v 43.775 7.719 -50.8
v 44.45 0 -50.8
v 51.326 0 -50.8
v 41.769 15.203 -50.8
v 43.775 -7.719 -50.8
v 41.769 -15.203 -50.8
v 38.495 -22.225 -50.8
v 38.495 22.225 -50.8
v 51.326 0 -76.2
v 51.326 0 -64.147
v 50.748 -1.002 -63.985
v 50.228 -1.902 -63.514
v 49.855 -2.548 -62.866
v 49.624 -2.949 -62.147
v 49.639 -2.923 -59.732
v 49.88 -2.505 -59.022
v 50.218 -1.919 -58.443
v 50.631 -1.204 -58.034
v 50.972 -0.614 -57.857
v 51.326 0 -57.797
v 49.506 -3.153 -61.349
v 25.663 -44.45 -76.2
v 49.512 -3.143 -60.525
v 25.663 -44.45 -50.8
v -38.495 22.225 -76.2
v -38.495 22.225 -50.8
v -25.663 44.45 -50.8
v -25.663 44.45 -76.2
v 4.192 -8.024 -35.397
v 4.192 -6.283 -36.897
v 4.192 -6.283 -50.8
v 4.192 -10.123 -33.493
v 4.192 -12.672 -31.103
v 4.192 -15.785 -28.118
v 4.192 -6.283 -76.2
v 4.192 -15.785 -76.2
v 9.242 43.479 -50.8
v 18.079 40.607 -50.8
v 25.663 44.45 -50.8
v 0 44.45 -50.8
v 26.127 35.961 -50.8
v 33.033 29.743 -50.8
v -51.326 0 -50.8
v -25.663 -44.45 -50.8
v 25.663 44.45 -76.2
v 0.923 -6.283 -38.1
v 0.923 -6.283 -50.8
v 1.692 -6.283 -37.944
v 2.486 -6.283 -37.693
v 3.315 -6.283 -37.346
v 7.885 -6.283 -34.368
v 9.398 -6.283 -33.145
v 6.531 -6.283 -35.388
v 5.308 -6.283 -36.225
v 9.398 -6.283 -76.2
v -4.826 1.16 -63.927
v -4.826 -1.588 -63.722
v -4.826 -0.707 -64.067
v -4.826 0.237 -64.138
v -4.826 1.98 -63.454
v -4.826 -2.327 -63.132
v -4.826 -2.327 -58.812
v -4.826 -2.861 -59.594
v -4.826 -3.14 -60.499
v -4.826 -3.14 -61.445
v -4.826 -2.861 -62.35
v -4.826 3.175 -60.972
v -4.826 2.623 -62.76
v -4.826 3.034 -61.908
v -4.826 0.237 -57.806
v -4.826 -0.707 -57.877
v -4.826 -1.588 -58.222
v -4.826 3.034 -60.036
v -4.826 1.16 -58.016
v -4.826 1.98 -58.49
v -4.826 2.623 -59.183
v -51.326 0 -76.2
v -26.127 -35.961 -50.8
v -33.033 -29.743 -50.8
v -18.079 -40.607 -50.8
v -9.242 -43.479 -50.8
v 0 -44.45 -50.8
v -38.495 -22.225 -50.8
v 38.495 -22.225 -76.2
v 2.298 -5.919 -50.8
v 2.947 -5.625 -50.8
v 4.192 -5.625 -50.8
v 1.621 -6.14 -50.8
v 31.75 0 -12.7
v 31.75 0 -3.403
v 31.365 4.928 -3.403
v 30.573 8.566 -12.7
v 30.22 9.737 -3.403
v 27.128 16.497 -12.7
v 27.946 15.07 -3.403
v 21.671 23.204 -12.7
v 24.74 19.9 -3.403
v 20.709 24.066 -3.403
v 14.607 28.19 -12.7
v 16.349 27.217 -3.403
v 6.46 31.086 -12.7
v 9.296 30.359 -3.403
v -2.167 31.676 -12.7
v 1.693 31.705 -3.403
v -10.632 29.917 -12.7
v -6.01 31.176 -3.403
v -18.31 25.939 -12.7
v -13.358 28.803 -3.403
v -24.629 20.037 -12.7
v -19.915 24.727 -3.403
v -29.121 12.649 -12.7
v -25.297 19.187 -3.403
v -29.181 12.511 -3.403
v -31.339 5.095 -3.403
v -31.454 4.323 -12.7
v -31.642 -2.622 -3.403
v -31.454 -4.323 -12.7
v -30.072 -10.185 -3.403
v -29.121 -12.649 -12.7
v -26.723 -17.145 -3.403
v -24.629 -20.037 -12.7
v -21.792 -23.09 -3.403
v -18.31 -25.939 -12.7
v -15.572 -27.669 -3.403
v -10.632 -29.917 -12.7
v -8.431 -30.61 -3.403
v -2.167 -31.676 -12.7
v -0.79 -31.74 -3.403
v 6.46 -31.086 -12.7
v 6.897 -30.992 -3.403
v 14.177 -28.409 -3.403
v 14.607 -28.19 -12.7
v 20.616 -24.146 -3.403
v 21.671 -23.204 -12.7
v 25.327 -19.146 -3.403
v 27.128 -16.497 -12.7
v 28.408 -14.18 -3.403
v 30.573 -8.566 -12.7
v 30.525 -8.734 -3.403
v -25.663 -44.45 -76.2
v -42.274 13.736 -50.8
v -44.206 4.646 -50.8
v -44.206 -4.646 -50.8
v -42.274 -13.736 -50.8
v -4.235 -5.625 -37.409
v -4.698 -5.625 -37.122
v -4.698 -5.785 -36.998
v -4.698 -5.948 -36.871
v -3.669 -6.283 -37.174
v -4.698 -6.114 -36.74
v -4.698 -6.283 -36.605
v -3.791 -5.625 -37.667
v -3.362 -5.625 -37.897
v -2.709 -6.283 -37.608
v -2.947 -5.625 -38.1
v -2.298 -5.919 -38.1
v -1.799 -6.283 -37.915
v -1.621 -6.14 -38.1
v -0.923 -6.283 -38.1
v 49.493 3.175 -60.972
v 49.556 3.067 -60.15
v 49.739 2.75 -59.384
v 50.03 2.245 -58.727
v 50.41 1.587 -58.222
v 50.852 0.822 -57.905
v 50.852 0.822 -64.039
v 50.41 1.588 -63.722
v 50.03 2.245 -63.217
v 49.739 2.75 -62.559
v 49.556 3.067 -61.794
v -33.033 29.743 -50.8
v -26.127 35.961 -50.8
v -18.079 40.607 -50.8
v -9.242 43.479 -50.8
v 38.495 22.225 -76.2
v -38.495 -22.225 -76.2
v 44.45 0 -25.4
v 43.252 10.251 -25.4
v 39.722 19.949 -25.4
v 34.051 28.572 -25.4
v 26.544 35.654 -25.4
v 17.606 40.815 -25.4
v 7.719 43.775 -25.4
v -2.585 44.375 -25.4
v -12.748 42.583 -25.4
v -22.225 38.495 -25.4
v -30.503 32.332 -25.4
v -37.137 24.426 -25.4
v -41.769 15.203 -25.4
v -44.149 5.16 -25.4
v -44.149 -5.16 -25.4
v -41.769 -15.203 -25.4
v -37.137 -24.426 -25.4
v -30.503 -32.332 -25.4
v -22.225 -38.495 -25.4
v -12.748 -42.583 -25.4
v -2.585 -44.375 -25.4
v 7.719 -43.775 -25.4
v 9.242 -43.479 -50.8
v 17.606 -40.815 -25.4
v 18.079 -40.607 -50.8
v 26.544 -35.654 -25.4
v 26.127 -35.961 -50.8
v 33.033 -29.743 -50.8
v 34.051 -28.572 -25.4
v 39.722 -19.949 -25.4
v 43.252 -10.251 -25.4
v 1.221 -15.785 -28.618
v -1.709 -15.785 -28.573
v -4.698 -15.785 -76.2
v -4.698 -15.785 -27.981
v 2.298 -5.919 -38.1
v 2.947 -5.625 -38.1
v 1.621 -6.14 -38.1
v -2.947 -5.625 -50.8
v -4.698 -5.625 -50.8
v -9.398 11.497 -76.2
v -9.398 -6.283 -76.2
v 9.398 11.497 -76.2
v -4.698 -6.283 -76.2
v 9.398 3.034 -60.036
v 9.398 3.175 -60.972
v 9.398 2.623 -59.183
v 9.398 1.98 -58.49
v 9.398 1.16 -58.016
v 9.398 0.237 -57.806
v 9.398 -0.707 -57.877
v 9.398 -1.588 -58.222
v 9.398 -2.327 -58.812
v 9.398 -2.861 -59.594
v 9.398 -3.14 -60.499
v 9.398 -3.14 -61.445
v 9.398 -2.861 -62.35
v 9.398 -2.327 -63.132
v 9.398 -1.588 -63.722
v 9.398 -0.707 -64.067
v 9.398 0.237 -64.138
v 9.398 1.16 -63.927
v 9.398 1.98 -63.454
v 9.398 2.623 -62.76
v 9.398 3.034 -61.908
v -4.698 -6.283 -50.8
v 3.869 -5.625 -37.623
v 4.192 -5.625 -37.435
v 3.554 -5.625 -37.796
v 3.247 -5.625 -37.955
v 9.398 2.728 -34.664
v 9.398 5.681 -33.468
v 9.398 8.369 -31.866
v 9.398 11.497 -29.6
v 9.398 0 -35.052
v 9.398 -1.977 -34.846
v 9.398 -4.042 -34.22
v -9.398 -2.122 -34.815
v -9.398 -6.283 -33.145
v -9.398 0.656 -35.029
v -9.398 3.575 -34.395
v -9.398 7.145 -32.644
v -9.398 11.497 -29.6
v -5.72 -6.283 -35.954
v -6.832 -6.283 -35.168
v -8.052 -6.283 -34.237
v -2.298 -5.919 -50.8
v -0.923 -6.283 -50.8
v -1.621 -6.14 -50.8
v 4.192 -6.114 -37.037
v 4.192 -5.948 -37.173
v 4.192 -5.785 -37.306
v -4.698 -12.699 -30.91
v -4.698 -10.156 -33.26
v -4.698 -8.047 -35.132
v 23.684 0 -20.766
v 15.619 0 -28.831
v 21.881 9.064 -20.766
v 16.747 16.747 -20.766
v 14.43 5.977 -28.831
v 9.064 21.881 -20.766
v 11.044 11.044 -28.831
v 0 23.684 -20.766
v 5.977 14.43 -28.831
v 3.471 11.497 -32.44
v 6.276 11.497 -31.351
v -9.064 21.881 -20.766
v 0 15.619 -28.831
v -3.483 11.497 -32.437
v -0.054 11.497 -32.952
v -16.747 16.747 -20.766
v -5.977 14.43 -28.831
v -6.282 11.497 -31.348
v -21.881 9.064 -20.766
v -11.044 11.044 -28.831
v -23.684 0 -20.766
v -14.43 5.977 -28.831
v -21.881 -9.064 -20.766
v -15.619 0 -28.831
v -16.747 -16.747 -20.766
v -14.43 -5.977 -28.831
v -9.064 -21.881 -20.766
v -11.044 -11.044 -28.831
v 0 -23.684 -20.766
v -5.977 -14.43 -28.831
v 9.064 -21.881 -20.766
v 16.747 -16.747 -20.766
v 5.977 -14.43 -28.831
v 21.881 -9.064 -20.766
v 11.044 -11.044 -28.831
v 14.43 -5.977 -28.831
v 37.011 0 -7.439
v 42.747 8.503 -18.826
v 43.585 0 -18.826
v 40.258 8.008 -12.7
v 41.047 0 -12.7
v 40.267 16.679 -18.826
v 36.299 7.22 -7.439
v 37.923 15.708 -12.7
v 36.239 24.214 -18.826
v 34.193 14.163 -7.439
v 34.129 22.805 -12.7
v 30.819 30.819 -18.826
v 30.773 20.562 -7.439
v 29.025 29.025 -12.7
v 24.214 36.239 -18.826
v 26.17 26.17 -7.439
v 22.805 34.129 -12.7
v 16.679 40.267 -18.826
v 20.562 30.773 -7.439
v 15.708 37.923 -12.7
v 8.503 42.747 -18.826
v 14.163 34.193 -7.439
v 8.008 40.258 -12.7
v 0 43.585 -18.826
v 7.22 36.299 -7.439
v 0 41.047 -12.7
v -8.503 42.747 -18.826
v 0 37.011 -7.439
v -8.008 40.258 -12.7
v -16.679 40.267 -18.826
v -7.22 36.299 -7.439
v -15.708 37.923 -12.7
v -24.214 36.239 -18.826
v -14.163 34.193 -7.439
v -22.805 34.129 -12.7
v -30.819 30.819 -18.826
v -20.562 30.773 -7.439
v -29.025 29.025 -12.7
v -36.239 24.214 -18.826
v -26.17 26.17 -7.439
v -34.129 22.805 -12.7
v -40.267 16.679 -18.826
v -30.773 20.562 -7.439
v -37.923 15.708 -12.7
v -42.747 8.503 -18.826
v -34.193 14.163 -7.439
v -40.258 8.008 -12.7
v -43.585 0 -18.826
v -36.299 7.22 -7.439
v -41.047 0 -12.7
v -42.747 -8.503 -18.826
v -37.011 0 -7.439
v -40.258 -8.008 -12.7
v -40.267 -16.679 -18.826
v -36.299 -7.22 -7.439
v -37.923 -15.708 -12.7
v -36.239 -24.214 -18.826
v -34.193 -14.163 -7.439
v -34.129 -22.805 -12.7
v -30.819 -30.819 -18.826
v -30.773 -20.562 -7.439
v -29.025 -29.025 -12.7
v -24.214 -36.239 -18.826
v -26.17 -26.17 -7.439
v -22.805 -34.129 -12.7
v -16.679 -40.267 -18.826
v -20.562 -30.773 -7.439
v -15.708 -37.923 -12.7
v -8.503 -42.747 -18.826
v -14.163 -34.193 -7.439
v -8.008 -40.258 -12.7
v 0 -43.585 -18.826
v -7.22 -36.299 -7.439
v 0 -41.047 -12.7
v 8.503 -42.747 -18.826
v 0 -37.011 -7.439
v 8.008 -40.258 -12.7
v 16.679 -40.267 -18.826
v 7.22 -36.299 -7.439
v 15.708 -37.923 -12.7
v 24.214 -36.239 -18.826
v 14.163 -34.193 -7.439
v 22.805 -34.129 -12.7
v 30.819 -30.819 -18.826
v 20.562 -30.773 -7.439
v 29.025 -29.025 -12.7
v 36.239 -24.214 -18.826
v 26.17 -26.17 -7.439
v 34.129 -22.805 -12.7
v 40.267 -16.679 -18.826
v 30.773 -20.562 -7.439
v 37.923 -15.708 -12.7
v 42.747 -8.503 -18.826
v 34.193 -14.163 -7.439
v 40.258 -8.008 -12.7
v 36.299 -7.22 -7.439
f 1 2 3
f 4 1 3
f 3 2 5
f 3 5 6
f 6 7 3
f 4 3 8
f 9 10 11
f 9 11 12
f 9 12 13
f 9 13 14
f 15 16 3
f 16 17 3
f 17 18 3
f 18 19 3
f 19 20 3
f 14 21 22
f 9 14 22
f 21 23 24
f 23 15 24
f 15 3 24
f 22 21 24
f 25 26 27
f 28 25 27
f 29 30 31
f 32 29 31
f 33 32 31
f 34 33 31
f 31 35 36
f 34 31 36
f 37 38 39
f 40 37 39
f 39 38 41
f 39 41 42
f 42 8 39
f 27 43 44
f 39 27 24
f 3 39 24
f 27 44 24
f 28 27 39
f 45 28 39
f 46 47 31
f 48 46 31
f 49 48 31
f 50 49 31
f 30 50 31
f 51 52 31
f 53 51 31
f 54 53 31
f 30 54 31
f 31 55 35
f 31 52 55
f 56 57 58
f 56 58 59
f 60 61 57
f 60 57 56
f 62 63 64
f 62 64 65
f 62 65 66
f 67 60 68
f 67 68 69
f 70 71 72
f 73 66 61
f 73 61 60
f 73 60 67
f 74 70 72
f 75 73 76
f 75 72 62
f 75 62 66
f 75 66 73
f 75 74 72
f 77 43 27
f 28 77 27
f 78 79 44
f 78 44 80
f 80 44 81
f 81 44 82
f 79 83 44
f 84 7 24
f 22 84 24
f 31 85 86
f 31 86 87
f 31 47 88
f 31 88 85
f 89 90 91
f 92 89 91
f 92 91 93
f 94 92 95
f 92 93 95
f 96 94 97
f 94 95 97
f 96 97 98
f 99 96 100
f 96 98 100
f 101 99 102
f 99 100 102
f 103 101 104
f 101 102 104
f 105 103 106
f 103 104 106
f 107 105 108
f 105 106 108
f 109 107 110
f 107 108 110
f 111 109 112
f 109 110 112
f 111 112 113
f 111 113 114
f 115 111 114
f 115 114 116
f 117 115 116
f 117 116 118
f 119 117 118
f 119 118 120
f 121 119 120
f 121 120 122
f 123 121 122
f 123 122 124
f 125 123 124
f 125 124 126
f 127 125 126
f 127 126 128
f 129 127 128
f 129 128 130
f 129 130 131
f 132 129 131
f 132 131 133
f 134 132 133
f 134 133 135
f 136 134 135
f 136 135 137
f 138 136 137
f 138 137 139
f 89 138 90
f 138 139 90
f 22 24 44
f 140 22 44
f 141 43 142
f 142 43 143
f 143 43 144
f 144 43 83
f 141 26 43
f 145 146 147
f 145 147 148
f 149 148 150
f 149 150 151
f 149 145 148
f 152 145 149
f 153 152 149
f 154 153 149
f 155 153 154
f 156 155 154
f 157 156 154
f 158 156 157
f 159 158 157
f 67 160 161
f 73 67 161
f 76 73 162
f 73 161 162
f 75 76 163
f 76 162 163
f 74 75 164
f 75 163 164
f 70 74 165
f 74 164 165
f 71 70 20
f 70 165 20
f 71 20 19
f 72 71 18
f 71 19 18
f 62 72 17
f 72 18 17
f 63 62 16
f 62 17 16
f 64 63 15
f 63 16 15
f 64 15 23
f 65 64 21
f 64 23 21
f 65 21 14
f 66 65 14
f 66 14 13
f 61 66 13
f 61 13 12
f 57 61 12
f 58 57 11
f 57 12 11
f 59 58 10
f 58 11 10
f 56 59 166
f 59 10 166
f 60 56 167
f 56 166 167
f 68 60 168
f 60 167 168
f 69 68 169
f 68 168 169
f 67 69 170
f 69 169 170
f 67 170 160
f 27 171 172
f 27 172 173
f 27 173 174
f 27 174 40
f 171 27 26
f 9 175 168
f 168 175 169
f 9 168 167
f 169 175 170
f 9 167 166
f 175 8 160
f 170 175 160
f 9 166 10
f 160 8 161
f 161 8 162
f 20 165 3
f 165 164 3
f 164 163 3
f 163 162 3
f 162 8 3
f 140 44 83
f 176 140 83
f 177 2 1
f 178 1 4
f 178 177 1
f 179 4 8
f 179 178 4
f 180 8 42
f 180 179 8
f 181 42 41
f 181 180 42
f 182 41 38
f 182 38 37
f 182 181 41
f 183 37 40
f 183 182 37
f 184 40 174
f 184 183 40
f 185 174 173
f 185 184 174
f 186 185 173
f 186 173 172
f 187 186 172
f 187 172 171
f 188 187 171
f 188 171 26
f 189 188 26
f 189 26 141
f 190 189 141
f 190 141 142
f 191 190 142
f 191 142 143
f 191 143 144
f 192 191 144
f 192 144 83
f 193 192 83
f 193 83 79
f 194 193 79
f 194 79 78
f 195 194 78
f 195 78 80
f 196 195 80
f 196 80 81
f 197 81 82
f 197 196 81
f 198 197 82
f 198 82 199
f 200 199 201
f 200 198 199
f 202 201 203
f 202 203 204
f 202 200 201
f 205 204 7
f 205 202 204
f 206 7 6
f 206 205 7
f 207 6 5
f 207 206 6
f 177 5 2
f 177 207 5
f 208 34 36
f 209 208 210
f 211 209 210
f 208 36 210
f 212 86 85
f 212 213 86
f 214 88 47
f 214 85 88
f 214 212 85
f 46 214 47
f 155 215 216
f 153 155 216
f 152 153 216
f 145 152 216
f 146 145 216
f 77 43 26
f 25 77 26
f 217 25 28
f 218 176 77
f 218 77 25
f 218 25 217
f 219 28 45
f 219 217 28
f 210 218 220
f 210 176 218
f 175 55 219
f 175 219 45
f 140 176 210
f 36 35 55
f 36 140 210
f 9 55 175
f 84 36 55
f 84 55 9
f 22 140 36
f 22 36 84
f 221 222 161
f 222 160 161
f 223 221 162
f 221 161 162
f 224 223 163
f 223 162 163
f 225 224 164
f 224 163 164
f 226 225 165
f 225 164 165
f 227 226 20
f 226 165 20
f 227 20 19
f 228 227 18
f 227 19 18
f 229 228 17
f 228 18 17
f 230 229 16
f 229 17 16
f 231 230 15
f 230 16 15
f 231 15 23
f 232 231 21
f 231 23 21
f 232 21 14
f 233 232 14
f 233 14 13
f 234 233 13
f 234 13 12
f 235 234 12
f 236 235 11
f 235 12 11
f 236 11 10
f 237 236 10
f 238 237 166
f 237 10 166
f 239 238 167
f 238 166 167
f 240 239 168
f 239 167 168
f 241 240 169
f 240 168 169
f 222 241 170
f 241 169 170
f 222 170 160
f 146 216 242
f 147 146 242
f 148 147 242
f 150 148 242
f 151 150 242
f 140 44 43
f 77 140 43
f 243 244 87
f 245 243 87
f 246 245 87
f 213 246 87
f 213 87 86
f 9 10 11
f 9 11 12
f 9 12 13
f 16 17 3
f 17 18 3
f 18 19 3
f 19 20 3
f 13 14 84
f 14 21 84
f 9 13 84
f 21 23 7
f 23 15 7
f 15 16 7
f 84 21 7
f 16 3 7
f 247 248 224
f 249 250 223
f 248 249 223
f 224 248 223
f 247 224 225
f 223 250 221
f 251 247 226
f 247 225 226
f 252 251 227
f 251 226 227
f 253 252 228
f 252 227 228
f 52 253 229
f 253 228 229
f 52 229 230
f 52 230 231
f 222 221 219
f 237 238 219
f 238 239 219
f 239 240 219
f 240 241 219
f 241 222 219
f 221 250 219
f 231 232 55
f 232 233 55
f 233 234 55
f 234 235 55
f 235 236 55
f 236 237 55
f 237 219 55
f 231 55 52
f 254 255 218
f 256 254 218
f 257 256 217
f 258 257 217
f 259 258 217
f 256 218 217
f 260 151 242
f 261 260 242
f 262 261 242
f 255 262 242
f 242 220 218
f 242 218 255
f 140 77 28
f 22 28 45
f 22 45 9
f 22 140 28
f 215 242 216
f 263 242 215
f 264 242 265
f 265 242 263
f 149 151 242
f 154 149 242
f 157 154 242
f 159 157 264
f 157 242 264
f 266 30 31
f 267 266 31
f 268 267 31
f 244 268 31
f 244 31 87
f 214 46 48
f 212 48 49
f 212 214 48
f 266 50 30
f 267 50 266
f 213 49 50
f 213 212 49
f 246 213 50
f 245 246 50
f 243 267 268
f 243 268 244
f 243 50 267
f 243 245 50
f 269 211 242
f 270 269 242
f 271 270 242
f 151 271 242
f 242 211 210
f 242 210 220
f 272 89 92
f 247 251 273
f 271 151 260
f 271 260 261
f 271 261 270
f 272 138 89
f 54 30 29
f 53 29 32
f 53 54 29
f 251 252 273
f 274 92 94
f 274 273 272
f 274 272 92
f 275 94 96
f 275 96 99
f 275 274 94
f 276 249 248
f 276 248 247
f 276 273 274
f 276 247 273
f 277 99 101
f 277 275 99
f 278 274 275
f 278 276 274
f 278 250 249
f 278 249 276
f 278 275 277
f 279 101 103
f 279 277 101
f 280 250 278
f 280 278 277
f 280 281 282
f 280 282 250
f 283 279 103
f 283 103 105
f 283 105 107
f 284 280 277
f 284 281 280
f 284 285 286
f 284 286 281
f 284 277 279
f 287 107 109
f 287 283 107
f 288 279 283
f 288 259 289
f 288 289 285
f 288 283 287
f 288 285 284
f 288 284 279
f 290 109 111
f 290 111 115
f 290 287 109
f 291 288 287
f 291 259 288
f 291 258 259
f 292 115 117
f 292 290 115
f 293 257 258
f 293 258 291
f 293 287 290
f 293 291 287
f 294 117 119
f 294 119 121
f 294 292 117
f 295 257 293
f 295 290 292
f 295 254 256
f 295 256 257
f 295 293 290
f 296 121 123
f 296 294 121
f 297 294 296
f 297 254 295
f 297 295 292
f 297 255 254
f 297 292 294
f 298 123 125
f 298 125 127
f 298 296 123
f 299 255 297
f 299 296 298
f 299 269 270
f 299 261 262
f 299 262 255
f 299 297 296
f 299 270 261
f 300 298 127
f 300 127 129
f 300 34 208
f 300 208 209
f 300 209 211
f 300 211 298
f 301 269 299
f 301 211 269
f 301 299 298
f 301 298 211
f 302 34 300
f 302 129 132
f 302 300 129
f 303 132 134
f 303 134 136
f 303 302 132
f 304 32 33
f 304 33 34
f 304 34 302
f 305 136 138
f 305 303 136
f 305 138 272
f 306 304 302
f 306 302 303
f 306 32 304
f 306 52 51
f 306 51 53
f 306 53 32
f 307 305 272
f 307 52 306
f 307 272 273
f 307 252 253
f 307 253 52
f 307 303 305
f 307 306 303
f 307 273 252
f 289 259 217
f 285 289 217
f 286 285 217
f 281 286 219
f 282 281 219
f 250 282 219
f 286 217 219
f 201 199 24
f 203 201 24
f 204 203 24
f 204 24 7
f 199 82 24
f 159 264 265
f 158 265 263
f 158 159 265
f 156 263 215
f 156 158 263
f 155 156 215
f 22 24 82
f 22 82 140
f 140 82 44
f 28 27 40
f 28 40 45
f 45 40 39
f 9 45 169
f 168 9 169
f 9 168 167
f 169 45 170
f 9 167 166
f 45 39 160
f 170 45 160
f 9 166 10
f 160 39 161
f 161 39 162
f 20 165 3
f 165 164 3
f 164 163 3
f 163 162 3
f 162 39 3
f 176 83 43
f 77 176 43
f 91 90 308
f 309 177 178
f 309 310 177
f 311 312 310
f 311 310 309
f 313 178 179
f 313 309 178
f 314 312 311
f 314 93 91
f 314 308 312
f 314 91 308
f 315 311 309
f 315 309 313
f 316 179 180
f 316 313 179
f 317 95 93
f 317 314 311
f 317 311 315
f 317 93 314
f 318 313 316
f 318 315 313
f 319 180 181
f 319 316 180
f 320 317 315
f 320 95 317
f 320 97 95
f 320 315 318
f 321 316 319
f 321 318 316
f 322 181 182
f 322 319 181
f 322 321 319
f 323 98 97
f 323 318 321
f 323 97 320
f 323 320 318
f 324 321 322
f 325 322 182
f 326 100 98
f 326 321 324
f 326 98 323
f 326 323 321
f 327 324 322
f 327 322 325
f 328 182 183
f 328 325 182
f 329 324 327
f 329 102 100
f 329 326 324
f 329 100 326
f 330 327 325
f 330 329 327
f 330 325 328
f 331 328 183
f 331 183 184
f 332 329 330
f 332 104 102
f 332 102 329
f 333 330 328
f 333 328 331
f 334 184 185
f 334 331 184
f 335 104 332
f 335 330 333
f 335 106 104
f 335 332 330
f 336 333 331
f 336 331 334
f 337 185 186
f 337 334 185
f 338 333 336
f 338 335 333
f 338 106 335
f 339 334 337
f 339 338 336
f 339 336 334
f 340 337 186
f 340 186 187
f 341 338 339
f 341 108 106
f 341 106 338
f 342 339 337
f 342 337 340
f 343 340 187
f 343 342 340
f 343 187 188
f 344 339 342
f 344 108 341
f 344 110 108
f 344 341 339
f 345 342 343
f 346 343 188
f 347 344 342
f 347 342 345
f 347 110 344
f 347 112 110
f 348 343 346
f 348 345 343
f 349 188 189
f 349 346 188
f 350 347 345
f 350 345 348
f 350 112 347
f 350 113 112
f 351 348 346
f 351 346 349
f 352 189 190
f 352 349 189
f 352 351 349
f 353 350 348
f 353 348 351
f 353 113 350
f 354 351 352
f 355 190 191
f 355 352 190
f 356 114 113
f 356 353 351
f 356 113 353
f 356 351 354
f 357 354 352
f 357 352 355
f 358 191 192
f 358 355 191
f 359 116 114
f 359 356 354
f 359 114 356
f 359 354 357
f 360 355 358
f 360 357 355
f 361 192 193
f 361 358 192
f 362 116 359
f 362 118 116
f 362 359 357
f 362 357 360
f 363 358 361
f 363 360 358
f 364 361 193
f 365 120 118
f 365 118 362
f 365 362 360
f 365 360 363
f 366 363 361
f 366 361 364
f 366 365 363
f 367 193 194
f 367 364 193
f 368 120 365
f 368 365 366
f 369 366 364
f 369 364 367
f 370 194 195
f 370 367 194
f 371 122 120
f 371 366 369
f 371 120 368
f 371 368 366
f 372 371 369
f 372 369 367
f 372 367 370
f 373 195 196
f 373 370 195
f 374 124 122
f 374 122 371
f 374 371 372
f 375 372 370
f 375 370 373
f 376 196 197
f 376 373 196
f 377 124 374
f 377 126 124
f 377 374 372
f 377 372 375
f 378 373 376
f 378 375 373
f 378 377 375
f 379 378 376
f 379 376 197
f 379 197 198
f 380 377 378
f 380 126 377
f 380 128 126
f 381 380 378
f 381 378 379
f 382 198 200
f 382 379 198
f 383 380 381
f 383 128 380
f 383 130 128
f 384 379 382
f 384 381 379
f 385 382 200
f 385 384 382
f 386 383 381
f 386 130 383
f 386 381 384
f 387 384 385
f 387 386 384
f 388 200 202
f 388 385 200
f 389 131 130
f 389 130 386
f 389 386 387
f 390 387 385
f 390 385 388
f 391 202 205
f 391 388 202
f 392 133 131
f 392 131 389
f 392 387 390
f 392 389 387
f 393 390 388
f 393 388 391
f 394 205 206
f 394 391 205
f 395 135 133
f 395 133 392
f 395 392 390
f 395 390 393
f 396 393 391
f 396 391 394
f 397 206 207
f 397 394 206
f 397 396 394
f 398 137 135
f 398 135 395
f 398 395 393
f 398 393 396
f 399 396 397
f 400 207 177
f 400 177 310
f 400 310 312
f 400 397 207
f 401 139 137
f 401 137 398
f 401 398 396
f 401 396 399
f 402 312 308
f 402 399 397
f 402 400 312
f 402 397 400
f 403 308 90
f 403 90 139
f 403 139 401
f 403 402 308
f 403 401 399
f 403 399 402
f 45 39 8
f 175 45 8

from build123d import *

# Parameters (mm, degrees)
F0_R           = 44.45
F1_DEPTH       = 50.8
F2_R           = 25.4
F3_R           = 31.75
F3_R_2         = 19.05
F4_DEPTH       = 38.1
F5_SIZE        = 25.4
F6_DEPTH       = 25.4
F7_R           = 6.35
F8_DEPTH       = 25.4
F11_DEPTH      = 25.4
F12_DEPTH      = 66.294
F13_DEPTH      = 50.8
F14_DEPTH      = 25.4
F10_W          = 8.89
F10_H          = 10.16
F15_DEPTH      = 50.8
F16_R          = 3.175
F17_DEPTH      = 143.002
F17_DEPTH_BACK = 4.826
F18_DEPTH      = 25.4


with BuildPart() as f1:
    # F0 (on Top) → F1 (new body)
    with BuildSketch(Plane.XY):
        Circle(F0_R)
    extrude(amount=-F1_DEPTH)

    # F2
    f2_edges = [f1.edges().sort_by_distance(p)[0] for p in [
        (-44.45, 0, 0),
    ]]
    fillet(f2_edges, radius=F2_R)

    # F3 (on face) → F4 (cut)
    with BuildSketch(Plane.XY):
        Circle(F3_R)
        Circle(F3_R_2, mode=Mode.SUBTRACT)
        Circle(F3_R_2)
    extrude(amount=-F4_DEPTH, mode=Mode.SUBTRACT)

    # F5
    f5_edges = [f1.edges().sort_by_distance(p)[0] for p in [
        (-31.75, 0, -38.1),
    ]]
    chamfer(f5_edges, length=F5_SIZE)

    # F6 (cut): a face of the model
    f6_faces = [f1.faces().sort_by_distance(p)[0] for p in [
        (0, 0, -38.1),
    ]]
    extrude(f6_faces, amount=-F6_DEPTH, mode=Mode.SUBTRACT)

    # F7 (on face) → F8 (join)
    with BuildSketch(Plane(origin=(0, 0, -50.8), x_dir=(1, 0, 0), z_dir=(0, 0, -1))):
        with BuildLine():
            Line((25.6632194655, 44.45), (-1.821e-07, 44.45))
            ThreePointArc((-1.821e-07, 44.45), (22.2250001111, 38.4948291341), (38.4948294175, 22.2249996201))
            Line((38.4948294175, 22.2249996201), (25.6632194655, 44.45))
        make_face()
        with BuildLine():
            Line((-1.821e-07, 44.45), (-25.6632194655, 44.45))
            Line((-25.6632194655, 44.45), (-38.4948287588, 22.225000761))
            ThreePointArc((-38.4948287588, 22.225000761), (-22.2249996983, 38.4948293724), (-1.821e-07, 44.45))
        make_face()
        with BuildLine():
            ThreePointArc((-38.4948297593, -22.2249990281), (-44.45, 1.0005e-06), (-38.4948287588, 22.225000761))
            Line((-38.4948287588, 22.225000761), (-51.326438931, 0))
            Line((-51.326438931, 0), (-38.4948297593, -22.2249990281))
        make_face()
        with BuildLine():
            ThreePointArc((38.4948294175, 22.2249996201), (22.2250001111, 38.4948291341), (-1.821e-07, 44.45))
            ThreePointArc((-1.821e-07, 44.45), (-22.2249996983, 38.4948293724), (-38.4948287588, 22.225000761))
            ThreePointArc((-38.4948287588, 22.225000761), (-44.45, 1.0005e-06), (-38.4948297593, -22.2249990281))
            ThreePointArc((-38.4948297593, -22.2249990281), (-22.225000486, -38.4948289177), (0, -44.45))
            ThreePointArc((0, -44.45), (22.224999859, -38.4948292796), (38.4948290354, -22.225000282))
            ThreePointArc((38.4948290354, -22.225000282), (42.9354029364, -11.5045067121), (44.45, 0))
            ThreePointArc((44.45, 0), (42.9354030353, 11.504506343), (38.4948294175, 22.2249996201))
        make_face()
        Circle(F7_R, mode=Mode.SUBTRACT)
        with BuildLine():
            ThreePointArc((0, -44.45), (-22.225000486, -38.4948289177), (-38.4948297593, -22.2249990281))
            Line((-38.4948297593, -22.2249990281), (-25.6632194655, -44.45))
            Line((-25.6632194655, -44.45), (0, -44.45))
        make_face()
        with BuildLine():
            ThreePointArc((38.4948290354, -22.225000282), (22.224999859, -38.4948292796), (0, -44.45))
            Line((0, -44.45), (25.6632194655, -44.45))
            Line((25.6632194655, -44.45), (38.4948290354, -22.225000282))
        make_face()
        with BuildLine():
            Line((51.326438931, 0), (38.4948294175, 22.2249996201))
            ThreePointArc((38.4948294175, 22.2249996201), (42.9354030353, 11.504506343), (44.45, 0))
            ThreePointArc((44.45, 0), (42.9354029364, -11.5045067121), (38.4948290354, -22.225000282))
            Line((38.4948290354, -22.225000282), (51.326438931, 0))
        make_face()
    extrude(amount=F8_DEPTH)

    # F9 (on face) → F11 (cut)
    with BuildSketch(Plane(origin=(0, 0, -76.2), x_dir=(1, 0, 0), z_dir=(0, 0, -1))):
        with BuildLine():
            Line((9.398, 6.2825600184), (0.92300575, 6.2825600184))
            ThreePointArc((0.92300575, 6.2825600184), (4.8053921022, 4.1509886465), (6.35, 0))
            ThreePointArc((6.35, 0), (4.4901280605, -4.4901280605), (0, -6.35))
            Line((0, -6.35), (0, -11.4974399816))
            Line((0, -11.4974399816), (9.398, -11.4974399816))
            Line((9.398, -11.4974399816), (9.398, 6.2825600184))
        make_face()
        with BuildLine():
            Line((-0.92300575, 6.2825600184), (-9.398, 6.2825600184))
            Line((-9.398, 6.2825600184), (-9.398, -11.4974399816))
            Line((-9.398, -11.4974399816), (0, -11.4974399816))
            Line((0, -11.4974399816), (0, -6.35))
            ThreePointArc((0, -6.35), (-6.3331175624, -0.4627331212), (-0.92300575, 6.2825600184))
        make_face()
    extrude(amount=-F11_DEPTH, mode=Mode.SUBTRACT)

    # F10 (on face) → F12 (cut)
    with BuildSketch(Plane(origin=(0, 0, -76.2), x_dir=(1, 0, 0), z_dir=(0, 0, -1))):
        with BuildLine():
            Line((-4.6976612952, 15.7848294268), (-4.6976612952, 6.2825600184))
            Line((-4.6976612952, 6.2825600184), (-0.92300575, 6.2825600184))
            ThreePointArc((-0.92300575, 6.2825600184), (0, 6.35), (0.92300575, 6.2825600184))
            Line((0.92300575, 6.2825600184), (4.1923387048, 6.2825600184))
            Line((4.1923387048, 6.2825600184), (4.1923387048, 15.7848294268))
            Line((4.1923387048, 15.7848294268), (-4.6976612952, 15.7848294268))
        make_face()
        Polygon((4.1923387048, 5.6248294268), (-4.6976612952, 5.6248294268), (-4.6976612952, 6.2825600184), (-9.398, 6.2825600184), (-9.398, -11.4974399816), (0, -11.4974399816), (9.398, -11.4974399816), (9.398, 6.2825600184), (4.1923387048, 6.2825600184), align=None)
    extrude(amount=-F12_DEPTH, mode=Mode.SUBTRACT)

    # F13 (cut): faces of the model
    f13_faces = [f1.faces().sort_by_distance(p)[0] for p in [
        (-3.353294615, -5.994297164, -50.8),
        (3.0859513727, -6.0042401288, -50.8),
    ]]
    extrude(f13_faces, amount=F13_DEPTH, mode=Mode.SUBTRACT)


with BuildPart() as f14:
    # F7 (on face) → F14 (new body)
    with BuildSketch(Plane(origin=(0, 0, -50.8), x_dir=(1, 0, 0), z_dir=(0, 0, -1))):
        Polygon((25.6632194655, 44.45), (-25.6632194655, 44.45), (-51.326438931, 0), (-25.6632194655, -44.45), (25.6632194655, -44.45), (51.326438931, 0), align=None)
    extrude(amount=F14_DEPTH)


with BuildPart() as f14b:
    # F10 (on face) → F14, piece 2 (new body)
    with BuildSketch(Plane(origin=(0, 0, -76.2), x_dir=(1, 0, 0), z_dir=(0, 0, -1))):
        with Locations((-0.2526612952, 10.7048294268)):
            Rectangle(F10_W, F10_H)
    extrude(amount=F14_DEPTH)

    # F15 (cut): a face of the model
    f15_faces = [f14b.faces().sort_by_distance(p)[0] for p in [
        (-0.2526612952, -10.7048294268, -101.6),
    ]]
    extrude(f15_faces, amount=-F15_DEPTH, mode=Mode.SUBTRACT)


with BuildPart() as f17_tool:
    # F16 (on Right) → F17 (new body, two sides)
    with BuildSketch(Plane.YZ) as f17_sk:
        with Locations((0, -60.9719515783)):
            Circle(F16_R)
    extrude(amount=F17_DEPTH)
    extrude(f17_sk.sketch, amount=-F17_DEPTH_BACK)


with BuildPart() as f1_1:
    add(f1.part)

    # F17: cut by f17_tool
    add(f17_tool.part, mode=Mode.SUBTRACT)



with BuildPart() as f14_1:
    add(f14.part)

    # F17: cut by f17_tool
    add(f17_tool.part, mode=Mode.SUBTRACT)


with BuildPart() as f1_2:
    add(f1_1.part)
    # F18 (cut): a face of the model
    f18_faces = [f14_1.part.faces().sort_by_distance(p)[0] for p in [
        (-4.826, 0, -60.9719515783),
    ]]
    extrude(f18_faces, amount=F18_DEPTH, mode=Mode.SUBTRACT)


solid = Compound([f14_1.part, f1_2.part])
